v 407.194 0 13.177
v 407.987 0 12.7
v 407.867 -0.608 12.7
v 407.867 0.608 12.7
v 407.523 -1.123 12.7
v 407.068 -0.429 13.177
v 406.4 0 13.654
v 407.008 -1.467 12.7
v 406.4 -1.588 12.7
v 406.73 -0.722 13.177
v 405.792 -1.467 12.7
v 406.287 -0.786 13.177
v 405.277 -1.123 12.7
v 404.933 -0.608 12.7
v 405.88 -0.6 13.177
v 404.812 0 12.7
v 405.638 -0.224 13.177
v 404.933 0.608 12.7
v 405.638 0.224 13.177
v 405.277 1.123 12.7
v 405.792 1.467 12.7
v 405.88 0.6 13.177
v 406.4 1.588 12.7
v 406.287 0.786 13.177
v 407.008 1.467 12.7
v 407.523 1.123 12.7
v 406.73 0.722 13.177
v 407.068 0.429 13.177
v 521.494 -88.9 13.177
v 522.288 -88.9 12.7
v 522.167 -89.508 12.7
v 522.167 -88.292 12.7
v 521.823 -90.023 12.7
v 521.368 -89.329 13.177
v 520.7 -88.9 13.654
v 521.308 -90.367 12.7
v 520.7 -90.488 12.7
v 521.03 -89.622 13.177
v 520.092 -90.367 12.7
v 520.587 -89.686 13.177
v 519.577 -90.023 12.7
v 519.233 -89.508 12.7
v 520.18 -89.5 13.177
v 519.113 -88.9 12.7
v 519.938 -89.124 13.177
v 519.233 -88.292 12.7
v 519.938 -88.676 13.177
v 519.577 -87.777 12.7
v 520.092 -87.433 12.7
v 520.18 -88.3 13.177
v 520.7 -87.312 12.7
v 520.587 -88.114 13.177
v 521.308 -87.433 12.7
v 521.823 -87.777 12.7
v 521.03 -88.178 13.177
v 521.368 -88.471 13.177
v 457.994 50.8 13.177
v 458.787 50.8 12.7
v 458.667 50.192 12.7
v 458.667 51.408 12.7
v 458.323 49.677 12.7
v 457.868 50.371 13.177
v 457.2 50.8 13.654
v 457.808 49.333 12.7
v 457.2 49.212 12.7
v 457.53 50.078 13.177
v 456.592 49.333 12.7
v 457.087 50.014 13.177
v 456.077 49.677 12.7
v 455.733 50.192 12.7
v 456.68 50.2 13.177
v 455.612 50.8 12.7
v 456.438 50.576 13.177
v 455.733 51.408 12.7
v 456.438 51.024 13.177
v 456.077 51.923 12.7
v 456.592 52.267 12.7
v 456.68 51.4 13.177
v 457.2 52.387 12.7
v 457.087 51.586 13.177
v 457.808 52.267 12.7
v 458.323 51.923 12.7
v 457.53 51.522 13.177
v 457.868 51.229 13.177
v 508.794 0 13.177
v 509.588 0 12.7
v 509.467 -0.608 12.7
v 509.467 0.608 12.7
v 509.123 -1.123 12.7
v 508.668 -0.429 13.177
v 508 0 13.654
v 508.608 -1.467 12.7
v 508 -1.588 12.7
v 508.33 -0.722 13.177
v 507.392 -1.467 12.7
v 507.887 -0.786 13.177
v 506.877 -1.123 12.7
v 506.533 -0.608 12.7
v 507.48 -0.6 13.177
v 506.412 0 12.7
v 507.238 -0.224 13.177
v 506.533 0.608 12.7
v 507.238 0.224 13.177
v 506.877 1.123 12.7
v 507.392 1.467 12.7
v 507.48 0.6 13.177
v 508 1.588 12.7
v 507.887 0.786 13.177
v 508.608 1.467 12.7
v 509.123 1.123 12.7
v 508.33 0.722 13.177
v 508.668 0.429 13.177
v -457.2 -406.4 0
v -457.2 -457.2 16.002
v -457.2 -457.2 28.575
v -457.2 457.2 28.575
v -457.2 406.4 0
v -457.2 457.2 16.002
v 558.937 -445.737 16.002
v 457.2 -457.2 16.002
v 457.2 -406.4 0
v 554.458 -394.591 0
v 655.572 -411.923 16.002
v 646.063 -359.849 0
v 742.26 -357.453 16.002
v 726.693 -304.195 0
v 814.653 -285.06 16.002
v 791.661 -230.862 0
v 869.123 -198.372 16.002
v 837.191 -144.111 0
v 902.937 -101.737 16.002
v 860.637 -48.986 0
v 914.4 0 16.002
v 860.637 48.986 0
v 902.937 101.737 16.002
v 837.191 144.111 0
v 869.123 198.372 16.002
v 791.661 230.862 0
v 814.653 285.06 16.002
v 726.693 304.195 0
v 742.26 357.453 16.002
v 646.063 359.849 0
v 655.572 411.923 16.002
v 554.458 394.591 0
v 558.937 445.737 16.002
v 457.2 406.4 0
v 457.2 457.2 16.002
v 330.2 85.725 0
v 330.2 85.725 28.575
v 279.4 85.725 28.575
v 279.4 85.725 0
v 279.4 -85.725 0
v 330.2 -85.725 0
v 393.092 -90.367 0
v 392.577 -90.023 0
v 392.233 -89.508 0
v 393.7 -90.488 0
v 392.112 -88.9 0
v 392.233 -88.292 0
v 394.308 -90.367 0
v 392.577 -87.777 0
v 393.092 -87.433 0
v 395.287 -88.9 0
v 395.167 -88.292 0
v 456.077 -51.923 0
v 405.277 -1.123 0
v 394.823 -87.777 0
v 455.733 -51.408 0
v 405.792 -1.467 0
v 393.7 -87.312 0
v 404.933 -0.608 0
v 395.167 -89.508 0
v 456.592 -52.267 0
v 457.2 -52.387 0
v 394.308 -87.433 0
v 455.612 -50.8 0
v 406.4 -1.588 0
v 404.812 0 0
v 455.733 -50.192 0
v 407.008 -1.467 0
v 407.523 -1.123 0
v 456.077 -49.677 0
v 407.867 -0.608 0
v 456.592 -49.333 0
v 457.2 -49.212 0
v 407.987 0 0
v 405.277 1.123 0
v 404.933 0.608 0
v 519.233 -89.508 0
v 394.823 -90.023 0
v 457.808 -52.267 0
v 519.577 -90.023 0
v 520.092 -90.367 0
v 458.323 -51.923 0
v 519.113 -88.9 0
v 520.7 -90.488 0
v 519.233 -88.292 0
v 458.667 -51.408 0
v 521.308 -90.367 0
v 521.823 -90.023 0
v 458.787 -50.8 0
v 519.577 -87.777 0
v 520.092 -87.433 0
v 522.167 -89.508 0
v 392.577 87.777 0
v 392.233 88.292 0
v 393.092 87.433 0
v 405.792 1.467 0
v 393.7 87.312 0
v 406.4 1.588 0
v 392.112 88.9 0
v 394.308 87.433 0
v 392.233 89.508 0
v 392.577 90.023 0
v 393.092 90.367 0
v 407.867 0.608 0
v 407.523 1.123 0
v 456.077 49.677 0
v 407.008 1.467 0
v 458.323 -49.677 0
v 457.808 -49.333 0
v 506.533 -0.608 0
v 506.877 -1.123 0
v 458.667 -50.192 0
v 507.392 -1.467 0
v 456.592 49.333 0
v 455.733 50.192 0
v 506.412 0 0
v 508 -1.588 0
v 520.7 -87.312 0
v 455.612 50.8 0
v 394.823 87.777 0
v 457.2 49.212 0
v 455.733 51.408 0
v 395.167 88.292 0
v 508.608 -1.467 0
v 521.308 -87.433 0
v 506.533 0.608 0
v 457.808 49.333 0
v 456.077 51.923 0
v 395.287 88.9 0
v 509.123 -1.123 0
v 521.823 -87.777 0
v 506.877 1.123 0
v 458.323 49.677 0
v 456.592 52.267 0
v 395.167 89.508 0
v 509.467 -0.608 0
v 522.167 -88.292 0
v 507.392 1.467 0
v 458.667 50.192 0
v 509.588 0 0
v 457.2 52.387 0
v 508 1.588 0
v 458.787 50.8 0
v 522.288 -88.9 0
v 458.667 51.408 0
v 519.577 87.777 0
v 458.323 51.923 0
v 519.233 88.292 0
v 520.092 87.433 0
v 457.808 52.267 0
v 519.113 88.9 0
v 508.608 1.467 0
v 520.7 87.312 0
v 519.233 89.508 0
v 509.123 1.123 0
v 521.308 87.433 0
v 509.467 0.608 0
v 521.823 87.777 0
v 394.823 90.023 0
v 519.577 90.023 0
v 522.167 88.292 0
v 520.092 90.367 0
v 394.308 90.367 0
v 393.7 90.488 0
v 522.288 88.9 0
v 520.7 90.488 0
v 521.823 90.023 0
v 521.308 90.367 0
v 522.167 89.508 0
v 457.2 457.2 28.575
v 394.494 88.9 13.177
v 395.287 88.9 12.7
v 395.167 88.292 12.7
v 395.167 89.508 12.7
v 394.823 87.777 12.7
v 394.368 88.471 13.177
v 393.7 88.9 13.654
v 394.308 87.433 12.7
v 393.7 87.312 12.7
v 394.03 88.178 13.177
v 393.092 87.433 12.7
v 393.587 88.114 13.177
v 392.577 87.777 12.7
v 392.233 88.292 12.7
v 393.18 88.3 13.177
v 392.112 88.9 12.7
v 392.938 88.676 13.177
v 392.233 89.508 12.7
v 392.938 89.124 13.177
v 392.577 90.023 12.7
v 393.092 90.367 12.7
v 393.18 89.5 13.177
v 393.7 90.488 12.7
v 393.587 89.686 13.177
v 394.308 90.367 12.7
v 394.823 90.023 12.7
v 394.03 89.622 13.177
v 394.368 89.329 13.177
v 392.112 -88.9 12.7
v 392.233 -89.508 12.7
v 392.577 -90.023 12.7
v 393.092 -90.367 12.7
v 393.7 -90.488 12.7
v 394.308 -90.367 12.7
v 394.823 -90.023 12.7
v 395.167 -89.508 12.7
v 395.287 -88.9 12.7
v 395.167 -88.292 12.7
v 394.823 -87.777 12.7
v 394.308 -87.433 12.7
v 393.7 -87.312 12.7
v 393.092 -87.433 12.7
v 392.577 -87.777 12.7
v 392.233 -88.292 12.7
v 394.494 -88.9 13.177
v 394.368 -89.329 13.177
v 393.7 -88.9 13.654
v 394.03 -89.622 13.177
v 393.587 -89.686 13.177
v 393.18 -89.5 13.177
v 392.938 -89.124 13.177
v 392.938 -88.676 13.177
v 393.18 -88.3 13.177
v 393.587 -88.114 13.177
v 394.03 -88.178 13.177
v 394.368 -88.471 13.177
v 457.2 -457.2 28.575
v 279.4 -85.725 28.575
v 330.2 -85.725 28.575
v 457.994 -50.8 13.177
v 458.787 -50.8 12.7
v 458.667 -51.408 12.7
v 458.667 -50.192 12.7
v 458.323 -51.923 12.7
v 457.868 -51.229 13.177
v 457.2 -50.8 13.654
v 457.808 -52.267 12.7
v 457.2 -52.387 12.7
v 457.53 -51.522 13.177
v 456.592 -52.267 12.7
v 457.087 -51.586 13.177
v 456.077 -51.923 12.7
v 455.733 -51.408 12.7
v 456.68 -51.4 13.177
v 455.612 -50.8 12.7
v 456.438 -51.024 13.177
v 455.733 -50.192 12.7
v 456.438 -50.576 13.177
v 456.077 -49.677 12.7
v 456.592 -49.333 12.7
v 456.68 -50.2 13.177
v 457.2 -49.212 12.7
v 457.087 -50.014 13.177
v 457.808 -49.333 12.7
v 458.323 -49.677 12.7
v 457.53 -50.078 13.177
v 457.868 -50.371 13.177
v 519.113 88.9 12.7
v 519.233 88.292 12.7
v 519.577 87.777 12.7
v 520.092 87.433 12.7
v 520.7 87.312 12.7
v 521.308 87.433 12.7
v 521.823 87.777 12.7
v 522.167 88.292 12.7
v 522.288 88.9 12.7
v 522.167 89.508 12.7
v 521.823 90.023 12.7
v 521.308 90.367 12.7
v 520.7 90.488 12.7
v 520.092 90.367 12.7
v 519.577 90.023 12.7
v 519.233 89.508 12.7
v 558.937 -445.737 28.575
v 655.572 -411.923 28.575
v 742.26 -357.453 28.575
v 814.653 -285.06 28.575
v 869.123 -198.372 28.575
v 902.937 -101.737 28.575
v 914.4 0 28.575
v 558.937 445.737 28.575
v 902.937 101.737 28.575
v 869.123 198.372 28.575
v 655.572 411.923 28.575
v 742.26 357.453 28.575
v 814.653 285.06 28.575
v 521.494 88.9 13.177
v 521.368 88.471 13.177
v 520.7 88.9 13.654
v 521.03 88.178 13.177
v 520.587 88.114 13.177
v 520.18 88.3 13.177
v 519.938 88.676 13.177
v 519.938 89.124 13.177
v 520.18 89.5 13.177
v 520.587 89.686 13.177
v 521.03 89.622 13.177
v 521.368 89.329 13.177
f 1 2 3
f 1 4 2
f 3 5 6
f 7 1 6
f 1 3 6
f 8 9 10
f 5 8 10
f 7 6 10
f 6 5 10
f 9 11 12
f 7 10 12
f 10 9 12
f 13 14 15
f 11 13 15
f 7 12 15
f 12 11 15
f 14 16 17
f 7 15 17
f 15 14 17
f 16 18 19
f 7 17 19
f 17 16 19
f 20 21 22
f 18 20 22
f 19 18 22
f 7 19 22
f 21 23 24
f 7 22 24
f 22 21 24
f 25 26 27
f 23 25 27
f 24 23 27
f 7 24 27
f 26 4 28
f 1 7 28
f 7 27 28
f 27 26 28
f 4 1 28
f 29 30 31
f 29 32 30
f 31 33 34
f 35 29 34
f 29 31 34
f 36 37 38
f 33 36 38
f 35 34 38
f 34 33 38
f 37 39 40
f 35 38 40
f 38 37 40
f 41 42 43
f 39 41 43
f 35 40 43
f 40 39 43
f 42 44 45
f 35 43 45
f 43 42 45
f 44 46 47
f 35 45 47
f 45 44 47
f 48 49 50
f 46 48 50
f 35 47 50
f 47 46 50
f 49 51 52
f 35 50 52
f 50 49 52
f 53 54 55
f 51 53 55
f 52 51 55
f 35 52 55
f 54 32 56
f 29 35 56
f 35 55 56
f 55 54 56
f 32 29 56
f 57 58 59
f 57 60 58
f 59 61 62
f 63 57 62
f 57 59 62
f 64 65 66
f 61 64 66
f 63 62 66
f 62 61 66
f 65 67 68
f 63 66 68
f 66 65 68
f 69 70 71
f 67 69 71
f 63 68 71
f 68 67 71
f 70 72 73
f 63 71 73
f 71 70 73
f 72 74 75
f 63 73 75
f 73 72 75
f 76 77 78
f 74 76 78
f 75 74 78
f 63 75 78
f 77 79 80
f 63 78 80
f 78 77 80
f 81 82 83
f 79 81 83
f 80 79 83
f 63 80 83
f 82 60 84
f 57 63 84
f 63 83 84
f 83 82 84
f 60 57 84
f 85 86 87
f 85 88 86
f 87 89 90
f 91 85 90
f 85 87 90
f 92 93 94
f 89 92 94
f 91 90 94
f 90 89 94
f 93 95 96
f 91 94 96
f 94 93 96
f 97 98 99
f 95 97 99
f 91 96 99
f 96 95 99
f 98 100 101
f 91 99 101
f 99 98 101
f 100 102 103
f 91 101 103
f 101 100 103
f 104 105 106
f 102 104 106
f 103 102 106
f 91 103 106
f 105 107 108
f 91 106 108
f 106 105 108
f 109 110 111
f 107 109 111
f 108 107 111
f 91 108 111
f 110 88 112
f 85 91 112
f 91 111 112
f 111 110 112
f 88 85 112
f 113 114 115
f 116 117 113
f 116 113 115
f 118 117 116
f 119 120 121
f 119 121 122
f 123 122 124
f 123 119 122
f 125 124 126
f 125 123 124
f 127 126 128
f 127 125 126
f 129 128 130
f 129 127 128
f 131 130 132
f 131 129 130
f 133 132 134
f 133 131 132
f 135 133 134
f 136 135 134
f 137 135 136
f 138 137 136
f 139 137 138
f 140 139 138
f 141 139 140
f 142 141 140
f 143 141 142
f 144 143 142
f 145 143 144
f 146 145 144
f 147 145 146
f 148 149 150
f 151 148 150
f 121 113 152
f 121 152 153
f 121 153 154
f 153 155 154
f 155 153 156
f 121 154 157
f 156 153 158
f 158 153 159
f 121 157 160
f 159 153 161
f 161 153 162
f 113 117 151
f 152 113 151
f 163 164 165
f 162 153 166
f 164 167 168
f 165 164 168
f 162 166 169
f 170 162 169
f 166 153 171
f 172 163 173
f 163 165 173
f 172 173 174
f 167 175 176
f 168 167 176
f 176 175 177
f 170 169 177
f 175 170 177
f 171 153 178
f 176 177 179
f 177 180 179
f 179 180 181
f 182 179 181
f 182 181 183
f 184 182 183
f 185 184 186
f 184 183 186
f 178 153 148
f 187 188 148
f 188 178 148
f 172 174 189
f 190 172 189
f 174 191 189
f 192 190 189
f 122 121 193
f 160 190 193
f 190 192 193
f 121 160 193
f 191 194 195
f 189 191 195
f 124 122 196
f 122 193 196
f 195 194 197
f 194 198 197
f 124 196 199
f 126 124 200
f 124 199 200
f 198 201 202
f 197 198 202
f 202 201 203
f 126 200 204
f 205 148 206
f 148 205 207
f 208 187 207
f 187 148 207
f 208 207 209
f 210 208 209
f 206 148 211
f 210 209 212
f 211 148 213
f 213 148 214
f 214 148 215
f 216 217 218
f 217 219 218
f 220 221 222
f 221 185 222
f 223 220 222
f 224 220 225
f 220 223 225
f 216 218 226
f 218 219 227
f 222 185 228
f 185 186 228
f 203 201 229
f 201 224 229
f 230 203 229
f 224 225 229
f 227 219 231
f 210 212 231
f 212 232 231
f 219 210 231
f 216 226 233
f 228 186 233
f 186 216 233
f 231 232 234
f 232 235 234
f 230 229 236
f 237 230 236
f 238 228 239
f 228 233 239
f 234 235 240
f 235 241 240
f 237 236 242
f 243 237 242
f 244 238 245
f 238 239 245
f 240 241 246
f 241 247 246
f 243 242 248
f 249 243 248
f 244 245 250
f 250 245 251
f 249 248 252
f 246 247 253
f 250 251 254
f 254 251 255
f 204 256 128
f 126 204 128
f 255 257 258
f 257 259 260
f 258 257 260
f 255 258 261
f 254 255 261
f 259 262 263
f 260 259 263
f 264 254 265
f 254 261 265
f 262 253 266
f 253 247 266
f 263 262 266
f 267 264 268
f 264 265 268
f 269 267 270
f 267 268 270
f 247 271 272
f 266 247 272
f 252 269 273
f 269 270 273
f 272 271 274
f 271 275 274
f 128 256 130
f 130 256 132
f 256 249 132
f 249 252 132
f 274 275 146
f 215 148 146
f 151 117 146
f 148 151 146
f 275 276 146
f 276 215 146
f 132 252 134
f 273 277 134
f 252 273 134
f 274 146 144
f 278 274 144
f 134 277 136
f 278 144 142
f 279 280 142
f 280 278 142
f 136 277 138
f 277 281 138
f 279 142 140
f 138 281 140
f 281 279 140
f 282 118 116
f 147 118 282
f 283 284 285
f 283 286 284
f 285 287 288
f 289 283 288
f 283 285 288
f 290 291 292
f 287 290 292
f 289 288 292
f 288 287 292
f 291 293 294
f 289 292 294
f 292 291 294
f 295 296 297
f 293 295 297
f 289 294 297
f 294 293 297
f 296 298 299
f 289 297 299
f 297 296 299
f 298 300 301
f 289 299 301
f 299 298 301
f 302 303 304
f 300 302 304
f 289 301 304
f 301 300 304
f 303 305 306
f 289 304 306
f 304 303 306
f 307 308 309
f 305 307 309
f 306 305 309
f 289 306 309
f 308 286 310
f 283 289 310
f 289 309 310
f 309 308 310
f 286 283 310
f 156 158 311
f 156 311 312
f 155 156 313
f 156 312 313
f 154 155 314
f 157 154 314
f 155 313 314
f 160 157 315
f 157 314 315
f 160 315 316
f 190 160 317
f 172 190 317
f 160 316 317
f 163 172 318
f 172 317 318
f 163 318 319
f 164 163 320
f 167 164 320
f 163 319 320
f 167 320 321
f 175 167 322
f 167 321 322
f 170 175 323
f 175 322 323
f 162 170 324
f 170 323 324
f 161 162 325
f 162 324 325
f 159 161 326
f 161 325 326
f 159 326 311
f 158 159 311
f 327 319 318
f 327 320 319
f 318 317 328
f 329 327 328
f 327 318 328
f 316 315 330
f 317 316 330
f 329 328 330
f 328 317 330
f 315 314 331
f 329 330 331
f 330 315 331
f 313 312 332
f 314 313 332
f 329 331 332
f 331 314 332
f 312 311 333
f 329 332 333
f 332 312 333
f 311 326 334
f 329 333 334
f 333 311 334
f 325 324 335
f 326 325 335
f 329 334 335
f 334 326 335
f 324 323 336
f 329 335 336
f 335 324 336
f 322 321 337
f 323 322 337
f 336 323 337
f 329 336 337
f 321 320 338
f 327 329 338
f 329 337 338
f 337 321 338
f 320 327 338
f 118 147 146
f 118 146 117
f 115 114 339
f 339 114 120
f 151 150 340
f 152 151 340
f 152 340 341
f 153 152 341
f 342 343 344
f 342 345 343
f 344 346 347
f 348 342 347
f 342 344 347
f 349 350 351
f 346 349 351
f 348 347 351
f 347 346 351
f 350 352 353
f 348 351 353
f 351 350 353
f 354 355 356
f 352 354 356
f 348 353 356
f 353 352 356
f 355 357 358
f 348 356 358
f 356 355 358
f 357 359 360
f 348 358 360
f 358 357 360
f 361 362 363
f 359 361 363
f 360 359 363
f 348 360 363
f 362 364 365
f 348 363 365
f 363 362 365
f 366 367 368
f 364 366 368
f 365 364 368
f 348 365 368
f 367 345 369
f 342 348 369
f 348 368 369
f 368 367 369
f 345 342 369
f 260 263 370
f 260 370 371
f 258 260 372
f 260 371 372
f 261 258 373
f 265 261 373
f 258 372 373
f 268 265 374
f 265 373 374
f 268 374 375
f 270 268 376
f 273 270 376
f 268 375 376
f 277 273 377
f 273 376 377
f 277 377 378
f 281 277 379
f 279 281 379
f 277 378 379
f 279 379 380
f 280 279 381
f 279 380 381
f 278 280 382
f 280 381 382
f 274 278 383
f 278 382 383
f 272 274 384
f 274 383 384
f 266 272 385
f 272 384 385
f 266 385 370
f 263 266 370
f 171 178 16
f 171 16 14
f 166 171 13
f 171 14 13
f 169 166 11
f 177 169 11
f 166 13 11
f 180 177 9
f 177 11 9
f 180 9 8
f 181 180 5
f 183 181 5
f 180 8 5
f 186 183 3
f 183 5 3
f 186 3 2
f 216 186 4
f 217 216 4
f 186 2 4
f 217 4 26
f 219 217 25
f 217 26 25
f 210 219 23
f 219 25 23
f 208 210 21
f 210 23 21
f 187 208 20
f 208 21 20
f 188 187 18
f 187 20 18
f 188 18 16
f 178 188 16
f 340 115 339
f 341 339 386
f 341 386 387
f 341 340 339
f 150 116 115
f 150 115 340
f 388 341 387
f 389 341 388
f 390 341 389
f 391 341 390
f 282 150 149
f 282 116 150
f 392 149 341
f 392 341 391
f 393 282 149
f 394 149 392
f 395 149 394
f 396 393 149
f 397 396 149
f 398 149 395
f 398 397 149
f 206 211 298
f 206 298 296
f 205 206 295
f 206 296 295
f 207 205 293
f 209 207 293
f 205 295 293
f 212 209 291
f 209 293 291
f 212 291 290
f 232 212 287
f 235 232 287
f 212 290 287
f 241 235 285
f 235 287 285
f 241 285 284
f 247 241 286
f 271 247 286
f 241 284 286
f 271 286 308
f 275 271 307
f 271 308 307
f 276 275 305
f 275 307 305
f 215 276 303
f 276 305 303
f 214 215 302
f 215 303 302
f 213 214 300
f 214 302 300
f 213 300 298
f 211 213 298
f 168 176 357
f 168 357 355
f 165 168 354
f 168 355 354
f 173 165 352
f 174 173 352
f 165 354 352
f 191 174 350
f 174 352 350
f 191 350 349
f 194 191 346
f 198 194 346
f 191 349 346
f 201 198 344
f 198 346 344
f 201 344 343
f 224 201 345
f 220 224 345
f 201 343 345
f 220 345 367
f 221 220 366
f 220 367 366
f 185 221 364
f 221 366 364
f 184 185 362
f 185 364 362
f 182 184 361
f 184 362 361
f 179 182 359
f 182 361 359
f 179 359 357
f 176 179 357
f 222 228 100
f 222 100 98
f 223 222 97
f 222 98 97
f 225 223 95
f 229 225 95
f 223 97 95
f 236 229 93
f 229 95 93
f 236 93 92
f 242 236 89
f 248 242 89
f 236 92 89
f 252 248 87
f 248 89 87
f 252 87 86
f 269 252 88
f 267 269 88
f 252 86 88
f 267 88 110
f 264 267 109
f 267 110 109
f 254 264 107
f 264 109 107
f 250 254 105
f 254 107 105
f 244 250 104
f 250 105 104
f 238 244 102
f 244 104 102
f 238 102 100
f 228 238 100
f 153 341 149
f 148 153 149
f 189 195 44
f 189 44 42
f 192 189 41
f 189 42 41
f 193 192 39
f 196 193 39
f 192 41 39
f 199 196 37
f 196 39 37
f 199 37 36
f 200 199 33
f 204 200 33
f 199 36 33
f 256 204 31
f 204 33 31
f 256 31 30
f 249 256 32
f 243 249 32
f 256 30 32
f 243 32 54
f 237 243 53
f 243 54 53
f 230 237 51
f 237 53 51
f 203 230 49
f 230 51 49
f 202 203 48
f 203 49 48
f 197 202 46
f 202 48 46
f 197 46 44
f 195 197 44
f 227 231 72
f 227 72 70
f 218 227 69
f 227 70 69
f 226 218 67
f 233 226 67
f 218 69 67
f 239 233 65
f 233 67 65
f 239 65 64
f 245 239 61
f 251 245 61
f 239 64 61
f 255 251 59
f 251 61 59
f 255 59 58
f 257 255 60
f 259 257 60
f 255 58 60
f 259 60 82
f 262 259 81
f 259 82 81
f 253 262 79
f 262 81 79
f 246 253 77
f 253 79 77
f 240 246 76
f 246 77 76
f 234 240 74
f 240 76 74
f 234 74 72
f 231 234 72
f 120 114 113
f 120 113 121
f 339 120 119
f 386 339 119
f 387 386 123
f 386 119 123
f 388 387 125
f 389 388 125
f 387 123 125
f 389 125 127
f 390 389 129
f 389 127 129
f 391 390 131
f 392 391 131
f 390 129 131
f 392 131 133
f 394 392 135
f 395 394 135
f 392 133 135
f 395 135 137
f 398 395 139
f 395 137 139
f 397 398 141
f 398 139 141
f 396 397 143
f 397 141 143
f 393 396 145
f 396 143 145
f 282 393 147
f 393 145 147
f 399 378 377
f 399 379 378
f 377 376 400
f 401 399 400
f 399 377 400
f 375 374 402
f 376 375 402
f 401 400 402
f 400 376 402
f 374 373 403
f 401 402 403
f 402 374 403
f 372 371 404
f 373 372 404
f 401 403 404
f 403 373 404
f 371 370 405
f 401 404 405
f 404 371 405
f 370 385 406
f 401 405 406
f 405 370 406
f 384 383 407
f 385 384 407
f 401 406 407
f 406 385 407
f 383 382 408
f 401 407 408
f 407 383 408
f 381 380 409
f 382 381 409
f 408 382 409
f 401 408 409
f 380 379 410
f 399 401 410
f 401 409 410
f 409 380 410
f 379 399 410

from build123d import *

# Parameters (mm, degrees)
F0_W     = 914.4
F0_H     = 914.4
F1_DEPTH = 28.575
F3_DEPTH = 31.75
F5_D     = 3.175
F5_DEPTH = 12.7
F5_TIP   = 0.9538662327
F6_SIZE2 = 16.002
F6_SIZE  = 50.8


with BuildPart() as f1:
    # F0 (on Top) → F1 (new body)
    with BuildSketch(Plane.XY):
        Rectangle(F0_W, F0_H)
        with BuildLine():
            ThreePointArc((457.2, -457.2), (914.4, 0), (457.2, 457.2))
            Line((457.2, 457.2), (457.2, -457.2))
        make_face()
    extrude(amount=F1_DEPTH)

    # F2 (on face) → F3 (cut)
    with BuildSketch(Plane.XY.offset(28.575)):
        Polygon((330.2, -85.725), (330.2, 0), (330.2, 85.725), (279.4, 85.725), (279.4, -85.725), align=None)
    extrude(amount=-F3_DEPTH, mode=Mode.SUBTRACT)

    # F5
    with Locations(Plane(origin=(0, 0, 0), x_dir=(1, 0, 0), z_dir=(0, 0, -1))):
        with Locations((393.7, 88.9), (520.7, 88.9), (457.2, 50.8), (406.4, 0), (508, 0), (457.2, -50.8), (393.7, -88.9), (520.7, -88.9)):
            Hole(F5_D / 2, depth=F5_DEPTH)
            with Locations((0, 0, -(F5_DEPTH + F5_TIP / 2))):  # 118° drill point
                Cone(0, F5_D / 2, F5_TIP, mode=Mode.SUBTRACT)

    # F6
    f6_edges = [f1.edges().sort_by_distance(p)[0] for p in [
        (0, -457.2, 0),
        (914.4, 0, 0),
        (0, 457.2, 0),
    ]]
    f6_side = f1.faces().sort_by_distance((182.702336, 0, 0))[0]
    chamfer(f6_edges, length=F6_SIZE, length2=F6_SIZE2, reference=f6_side)


solid = f1.part
